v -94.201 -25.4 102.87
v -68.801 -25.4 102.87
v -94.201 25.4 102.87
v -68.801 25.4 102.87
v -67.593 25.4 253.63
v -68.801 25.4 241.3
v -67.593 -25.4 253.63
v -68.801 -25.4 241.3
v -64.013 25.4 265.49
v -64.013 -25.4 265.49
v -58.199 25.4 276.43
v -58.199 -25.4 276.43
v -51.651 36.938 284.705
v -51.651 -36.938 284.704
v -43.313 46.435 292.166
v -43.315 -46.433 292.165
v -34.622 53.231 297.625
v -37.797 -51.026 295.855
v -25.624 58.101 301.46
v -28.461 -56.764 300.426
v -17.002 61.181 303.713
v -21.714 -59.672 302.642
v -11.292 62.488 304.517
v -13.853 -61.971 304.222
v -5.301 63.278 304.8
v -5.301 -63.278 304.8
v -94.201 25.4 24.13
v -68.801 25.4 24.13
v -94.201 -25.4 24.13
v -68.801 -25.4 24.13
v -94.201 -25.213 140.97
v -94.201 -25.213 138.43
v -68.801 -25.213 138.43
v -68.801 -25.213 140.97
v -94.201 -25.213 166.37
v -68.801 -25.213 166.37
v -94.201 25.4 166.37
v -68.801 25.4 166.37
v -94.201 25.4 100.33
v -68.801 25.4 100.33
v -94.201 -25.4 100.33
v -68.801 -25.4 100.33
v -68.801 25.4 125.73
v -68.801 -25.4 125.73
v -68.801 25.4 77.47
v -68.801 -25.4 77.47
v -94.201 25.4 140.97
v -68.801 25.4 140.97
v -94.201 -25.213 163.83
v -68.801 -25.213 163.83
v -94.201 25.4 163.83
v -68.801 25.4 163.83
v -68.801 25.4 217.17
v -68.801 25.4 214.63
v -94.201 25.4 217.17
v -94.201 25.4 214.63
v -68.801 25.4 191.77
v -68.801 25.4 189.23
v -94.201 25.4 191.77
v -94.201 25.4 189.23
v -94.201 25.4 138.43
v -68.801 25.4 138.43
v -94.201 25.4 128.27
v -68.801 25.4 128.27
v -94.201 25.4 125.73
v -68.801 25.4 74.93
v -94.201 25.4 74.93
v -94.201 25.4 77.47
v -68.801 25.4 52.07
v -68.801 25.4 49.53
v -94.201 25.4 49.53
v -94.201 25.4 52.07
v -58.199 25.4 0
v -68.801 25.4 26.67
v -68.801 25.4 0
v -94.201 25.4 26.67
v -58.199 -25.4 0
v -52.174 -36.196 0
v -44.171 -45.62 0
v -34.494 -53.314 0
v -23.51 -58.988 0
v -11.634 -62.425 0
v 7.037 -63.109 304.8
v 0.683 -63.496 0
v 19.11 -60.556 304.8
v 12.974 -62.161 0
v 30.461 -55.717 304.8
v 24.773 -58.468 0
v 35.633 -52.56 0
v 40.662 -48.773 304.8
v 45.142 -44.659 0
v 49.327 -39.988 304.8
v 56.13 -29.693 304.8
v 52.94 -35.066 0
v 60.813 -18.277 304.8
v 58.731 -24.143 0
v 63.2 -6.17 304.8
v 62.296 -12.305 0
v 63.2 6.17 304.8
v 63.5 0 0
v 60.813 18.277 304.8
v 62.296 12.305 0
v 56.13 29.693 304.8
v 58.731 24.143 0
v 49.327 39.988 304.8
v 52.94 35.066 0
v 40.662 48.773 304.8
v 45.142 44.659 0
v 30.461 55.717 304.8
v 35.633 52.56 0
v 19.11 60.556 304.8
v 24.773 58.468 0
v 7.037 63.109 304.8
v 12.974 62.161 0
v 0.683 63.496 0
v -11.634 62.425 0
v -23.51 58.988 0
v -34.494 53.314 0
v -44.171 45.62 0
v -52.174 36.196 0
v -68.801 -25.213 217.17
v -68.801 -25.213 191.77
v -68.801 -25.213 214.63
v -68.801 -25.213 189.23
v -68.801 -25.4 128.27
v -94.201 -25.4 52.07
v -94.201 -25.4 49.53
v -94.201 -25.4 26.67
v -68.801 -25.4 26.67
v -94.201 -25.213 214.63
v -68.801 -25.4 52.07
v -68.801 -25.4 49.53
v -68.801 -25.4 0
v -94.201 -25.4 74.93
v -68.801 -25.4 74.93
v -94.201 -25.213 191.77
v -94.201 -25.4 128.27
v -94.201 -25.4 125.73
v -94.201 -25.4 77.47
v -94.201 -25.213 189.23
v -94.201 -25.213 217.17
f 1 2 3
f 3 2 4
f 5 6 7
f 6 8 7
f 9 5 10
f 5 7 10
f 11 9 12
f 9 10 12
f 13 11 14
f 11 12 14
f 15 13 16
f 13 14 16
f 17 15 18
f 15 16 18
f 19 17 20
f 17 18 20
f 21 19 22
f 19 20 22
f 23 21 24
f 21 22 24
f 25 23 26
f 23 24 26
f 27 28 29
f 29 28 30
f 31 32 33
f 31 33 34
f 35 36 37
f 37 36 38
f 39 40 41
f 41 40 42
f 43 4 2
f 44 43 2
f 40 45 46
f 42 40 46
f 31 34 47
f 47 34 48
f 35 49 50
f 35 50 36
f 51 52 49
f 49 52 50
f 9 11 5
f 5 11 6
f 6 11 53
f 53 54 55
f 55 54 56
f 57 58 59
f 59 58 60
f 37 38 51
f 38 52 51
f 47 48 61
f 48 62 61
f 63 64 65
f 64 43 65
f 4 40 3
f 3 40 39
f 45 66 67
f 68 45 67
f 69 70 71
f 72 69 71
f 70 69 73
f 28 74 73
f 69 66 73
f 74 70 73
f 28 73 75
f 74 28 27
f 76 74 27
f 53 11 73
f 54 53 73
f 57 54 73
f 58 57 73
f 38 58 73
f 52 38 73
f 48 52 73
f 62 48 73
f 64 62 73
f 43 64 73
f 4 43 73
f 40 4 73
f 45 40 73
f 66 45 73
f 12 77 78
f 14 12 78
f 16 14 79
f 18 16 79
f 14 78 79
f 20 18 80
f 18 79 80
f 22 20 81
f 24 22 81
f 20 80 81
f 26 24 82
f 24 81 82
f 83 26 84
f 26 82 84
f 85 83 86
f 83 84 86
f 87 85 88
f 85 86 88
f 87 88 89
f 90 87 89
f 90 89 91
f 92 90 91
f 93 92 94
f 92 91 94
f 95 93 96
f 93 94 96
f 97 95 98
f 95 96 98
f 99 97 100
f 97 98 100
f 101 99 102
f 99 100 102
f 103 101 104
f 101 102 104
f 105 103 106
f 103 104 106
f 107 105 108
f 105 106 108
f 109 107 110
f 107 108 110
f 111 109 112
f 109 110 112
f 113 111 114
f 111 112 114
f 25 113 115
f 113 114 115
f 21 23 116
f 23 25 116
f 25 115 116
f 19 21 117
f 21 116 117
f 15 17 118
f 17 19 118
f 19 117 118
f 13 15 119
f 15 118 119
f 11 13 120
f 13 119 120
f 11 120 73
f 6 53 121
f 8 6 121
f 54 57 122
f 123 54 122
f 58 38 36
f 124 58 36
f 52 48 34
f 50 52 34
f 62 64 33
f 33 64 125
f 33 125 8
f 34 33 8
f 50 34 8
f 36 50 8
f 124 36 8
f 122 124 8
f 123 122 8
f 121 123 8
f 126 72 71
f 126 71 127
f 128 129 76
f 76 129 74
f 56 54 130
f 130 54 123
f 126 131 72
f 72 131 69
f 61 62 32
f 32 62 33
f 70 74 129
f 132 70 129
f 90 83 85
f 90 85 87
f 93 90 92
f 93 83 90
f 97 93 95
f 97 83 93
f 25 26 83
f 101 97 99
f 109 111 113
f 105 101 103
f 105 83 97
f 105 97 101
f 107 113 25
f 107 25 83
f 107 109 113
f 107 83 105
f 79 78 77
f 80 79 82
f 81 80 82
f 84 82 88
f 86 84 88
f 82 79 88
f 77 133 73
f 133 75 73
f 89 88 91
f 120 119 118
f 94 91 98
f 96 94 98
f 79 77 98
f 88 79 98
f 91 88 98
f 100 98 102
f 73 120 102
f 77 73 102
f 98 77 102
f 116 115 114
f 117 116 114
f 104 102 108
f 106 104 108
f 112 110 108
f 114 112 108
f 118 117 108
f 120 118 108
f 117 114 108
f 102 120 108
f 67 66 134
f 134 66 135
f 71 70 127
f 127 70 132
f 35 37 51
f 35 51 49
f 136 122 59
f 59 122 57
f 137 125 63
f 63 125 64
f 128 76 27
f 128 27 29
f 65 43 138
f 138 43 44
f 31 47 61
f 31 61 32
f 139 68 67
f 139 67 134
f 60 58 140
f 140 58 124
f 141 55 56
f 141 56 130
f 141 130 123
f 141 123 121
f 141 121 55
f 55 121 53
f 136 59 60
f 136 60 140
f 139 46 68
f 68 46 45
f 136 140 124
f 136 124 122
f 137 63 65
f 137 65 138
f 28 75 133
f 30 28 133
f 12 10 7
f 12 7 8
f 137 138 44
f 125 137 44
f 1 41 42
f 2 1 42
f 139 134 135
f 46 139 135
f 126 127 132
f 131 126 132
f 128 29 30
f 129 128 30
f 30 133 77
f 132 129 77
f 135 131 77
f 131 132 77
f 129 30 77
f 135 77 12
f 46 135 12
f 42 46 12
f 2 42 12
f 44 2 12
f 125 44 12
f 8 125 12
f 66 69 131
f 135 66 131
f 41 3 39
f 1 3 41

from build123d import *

# Parameters (mm, degrees)
F1_DEPTH = 304.8
F2_R     = 63.5
F4_DEPTH = 25.4


with BuildPart() as f1:
    # F0 (on Top) → F1 (new body)
    with BuildSketch(Plane.XY):
        with BuildLine():
            Line((-68.801289, -25.4), (-58.198711, -25.4))
            ThreePointArc((-58.198711, -25.4), (63.5, 0), (-58.198711, 25.4))
            Line((-58.198711, 25.4), (-68.801289, 25.4))
            Line((-68.801289, 25.4), (-68.801289, -25.4))
        make_face()
    extrude(amount=F1_DEPTH)

    # F2
    f2_edges = [f1.edges().sort_by_distance(p)[0] for p in [
        (-68.801289, 0, 304.8),
    ]]
    fillet(f2_edges, radius=F2_R)

    # F3 (on face) → F4 (join)
    with BuildSketch(Plane(origin=(-68.801289, 0, 0), x_dir=(0, -1, 0), z_dir=(-1, 0, 0))):
        Polygon((-0.093374, 215.9), (-0.093374, 217.17), (-25.4, 217.17), (-25.4, 214.63), (-0.093374, 214.63), align=None)
        Polygon((25.213252, 217.17), (-0.093374, 217.17), (-0.093374, 215.9), (-0.093374, 214.63), (25.213252, 214.63), align=None)
        Polygon((-0.093374, 190.5), (-0.093374, 189.23), (25.213252, 189.23), (25.213252, 191.77), (-0.093374, 191.77), align=None)
        Polygon((-25.4, 191.77), (-25.4, 189.23), (-0.093374, 189.23), (-0.093374, 190.5), (-0.093374, 191.77), align=None)
        Polygon((-25.4, 166.37), (-25.4, 163.83), (-0.093374, 163.83), (-0.093374, 165.1), (-0.093374, 166.37), align=None)
        Polygon((-0.093374, 165.1), (-0.093374, 163.83), (25.213252, 163.83), (25.213252, 166.37), (-0.093374, 166.37), align=None)
        Polygon((-25.4, 128.27), (-25.4, 125.73), (0, 125.73), (0, 127), (-0.009337, 128.27), align=None)
        Polygon((-25.4, 140.97), (-25.4, 138.43), (-0.084037, 138.43), (-0.093374, 139.7), (-0.093374, 140.97), align=None)
        Polygon((-0.093374, 139.7), (-0.084037, 138.43), (25.213252, 138.43), (25.213252, 140.97), (-0.093374, 140.97), align=None)
        Polygon((0, 127), (0, 125.73), (25.4, 125.73), (25.4, 128.27), (-0.009337, 128.27), align=None)
        Polygon((-25.4, 102.87), (-25.4, 100.33), (0, 100.33), (0, 101.6), (0, 102.87), align=None)
        Polygon((0, 101.6), (0, 100.33), (25.4, 100.33), (25.4, 102.87), (0, 102.87), align=None)
        Polygon((-25.4, 77.47), (-25.4, 74.93), (0, 74.93), (0, 76.2), (0, 77.47), align=None)
        Polygon((-25.4, 52.07), (-25.4, 49.53), (0, 49.53), (0, 50.8), (0, 52.07), align=None)
        Polygon((0, 50.8), (0, 49.53), (25.4, 49.53), (25.4, 52.07), (0, 52.07), align=None)
        Polygon((0, 76.2), (0, 74.93), (25.4, 74.93), (25.4, 77.47), (0, 77.47), align=None)
        Polygon((-25.4, 26.67), (-25.4, 24.13), (0, 24.13), (0, 25.4), (0, 26.67), align=None)
        Polygon((0, 25.4), (0, 24.13), (25.4, 24.13), (25.4, 26.67), (0, 26.67), align=None)
    extrude(amount=F4_DEPTH)


solid = f1.part
